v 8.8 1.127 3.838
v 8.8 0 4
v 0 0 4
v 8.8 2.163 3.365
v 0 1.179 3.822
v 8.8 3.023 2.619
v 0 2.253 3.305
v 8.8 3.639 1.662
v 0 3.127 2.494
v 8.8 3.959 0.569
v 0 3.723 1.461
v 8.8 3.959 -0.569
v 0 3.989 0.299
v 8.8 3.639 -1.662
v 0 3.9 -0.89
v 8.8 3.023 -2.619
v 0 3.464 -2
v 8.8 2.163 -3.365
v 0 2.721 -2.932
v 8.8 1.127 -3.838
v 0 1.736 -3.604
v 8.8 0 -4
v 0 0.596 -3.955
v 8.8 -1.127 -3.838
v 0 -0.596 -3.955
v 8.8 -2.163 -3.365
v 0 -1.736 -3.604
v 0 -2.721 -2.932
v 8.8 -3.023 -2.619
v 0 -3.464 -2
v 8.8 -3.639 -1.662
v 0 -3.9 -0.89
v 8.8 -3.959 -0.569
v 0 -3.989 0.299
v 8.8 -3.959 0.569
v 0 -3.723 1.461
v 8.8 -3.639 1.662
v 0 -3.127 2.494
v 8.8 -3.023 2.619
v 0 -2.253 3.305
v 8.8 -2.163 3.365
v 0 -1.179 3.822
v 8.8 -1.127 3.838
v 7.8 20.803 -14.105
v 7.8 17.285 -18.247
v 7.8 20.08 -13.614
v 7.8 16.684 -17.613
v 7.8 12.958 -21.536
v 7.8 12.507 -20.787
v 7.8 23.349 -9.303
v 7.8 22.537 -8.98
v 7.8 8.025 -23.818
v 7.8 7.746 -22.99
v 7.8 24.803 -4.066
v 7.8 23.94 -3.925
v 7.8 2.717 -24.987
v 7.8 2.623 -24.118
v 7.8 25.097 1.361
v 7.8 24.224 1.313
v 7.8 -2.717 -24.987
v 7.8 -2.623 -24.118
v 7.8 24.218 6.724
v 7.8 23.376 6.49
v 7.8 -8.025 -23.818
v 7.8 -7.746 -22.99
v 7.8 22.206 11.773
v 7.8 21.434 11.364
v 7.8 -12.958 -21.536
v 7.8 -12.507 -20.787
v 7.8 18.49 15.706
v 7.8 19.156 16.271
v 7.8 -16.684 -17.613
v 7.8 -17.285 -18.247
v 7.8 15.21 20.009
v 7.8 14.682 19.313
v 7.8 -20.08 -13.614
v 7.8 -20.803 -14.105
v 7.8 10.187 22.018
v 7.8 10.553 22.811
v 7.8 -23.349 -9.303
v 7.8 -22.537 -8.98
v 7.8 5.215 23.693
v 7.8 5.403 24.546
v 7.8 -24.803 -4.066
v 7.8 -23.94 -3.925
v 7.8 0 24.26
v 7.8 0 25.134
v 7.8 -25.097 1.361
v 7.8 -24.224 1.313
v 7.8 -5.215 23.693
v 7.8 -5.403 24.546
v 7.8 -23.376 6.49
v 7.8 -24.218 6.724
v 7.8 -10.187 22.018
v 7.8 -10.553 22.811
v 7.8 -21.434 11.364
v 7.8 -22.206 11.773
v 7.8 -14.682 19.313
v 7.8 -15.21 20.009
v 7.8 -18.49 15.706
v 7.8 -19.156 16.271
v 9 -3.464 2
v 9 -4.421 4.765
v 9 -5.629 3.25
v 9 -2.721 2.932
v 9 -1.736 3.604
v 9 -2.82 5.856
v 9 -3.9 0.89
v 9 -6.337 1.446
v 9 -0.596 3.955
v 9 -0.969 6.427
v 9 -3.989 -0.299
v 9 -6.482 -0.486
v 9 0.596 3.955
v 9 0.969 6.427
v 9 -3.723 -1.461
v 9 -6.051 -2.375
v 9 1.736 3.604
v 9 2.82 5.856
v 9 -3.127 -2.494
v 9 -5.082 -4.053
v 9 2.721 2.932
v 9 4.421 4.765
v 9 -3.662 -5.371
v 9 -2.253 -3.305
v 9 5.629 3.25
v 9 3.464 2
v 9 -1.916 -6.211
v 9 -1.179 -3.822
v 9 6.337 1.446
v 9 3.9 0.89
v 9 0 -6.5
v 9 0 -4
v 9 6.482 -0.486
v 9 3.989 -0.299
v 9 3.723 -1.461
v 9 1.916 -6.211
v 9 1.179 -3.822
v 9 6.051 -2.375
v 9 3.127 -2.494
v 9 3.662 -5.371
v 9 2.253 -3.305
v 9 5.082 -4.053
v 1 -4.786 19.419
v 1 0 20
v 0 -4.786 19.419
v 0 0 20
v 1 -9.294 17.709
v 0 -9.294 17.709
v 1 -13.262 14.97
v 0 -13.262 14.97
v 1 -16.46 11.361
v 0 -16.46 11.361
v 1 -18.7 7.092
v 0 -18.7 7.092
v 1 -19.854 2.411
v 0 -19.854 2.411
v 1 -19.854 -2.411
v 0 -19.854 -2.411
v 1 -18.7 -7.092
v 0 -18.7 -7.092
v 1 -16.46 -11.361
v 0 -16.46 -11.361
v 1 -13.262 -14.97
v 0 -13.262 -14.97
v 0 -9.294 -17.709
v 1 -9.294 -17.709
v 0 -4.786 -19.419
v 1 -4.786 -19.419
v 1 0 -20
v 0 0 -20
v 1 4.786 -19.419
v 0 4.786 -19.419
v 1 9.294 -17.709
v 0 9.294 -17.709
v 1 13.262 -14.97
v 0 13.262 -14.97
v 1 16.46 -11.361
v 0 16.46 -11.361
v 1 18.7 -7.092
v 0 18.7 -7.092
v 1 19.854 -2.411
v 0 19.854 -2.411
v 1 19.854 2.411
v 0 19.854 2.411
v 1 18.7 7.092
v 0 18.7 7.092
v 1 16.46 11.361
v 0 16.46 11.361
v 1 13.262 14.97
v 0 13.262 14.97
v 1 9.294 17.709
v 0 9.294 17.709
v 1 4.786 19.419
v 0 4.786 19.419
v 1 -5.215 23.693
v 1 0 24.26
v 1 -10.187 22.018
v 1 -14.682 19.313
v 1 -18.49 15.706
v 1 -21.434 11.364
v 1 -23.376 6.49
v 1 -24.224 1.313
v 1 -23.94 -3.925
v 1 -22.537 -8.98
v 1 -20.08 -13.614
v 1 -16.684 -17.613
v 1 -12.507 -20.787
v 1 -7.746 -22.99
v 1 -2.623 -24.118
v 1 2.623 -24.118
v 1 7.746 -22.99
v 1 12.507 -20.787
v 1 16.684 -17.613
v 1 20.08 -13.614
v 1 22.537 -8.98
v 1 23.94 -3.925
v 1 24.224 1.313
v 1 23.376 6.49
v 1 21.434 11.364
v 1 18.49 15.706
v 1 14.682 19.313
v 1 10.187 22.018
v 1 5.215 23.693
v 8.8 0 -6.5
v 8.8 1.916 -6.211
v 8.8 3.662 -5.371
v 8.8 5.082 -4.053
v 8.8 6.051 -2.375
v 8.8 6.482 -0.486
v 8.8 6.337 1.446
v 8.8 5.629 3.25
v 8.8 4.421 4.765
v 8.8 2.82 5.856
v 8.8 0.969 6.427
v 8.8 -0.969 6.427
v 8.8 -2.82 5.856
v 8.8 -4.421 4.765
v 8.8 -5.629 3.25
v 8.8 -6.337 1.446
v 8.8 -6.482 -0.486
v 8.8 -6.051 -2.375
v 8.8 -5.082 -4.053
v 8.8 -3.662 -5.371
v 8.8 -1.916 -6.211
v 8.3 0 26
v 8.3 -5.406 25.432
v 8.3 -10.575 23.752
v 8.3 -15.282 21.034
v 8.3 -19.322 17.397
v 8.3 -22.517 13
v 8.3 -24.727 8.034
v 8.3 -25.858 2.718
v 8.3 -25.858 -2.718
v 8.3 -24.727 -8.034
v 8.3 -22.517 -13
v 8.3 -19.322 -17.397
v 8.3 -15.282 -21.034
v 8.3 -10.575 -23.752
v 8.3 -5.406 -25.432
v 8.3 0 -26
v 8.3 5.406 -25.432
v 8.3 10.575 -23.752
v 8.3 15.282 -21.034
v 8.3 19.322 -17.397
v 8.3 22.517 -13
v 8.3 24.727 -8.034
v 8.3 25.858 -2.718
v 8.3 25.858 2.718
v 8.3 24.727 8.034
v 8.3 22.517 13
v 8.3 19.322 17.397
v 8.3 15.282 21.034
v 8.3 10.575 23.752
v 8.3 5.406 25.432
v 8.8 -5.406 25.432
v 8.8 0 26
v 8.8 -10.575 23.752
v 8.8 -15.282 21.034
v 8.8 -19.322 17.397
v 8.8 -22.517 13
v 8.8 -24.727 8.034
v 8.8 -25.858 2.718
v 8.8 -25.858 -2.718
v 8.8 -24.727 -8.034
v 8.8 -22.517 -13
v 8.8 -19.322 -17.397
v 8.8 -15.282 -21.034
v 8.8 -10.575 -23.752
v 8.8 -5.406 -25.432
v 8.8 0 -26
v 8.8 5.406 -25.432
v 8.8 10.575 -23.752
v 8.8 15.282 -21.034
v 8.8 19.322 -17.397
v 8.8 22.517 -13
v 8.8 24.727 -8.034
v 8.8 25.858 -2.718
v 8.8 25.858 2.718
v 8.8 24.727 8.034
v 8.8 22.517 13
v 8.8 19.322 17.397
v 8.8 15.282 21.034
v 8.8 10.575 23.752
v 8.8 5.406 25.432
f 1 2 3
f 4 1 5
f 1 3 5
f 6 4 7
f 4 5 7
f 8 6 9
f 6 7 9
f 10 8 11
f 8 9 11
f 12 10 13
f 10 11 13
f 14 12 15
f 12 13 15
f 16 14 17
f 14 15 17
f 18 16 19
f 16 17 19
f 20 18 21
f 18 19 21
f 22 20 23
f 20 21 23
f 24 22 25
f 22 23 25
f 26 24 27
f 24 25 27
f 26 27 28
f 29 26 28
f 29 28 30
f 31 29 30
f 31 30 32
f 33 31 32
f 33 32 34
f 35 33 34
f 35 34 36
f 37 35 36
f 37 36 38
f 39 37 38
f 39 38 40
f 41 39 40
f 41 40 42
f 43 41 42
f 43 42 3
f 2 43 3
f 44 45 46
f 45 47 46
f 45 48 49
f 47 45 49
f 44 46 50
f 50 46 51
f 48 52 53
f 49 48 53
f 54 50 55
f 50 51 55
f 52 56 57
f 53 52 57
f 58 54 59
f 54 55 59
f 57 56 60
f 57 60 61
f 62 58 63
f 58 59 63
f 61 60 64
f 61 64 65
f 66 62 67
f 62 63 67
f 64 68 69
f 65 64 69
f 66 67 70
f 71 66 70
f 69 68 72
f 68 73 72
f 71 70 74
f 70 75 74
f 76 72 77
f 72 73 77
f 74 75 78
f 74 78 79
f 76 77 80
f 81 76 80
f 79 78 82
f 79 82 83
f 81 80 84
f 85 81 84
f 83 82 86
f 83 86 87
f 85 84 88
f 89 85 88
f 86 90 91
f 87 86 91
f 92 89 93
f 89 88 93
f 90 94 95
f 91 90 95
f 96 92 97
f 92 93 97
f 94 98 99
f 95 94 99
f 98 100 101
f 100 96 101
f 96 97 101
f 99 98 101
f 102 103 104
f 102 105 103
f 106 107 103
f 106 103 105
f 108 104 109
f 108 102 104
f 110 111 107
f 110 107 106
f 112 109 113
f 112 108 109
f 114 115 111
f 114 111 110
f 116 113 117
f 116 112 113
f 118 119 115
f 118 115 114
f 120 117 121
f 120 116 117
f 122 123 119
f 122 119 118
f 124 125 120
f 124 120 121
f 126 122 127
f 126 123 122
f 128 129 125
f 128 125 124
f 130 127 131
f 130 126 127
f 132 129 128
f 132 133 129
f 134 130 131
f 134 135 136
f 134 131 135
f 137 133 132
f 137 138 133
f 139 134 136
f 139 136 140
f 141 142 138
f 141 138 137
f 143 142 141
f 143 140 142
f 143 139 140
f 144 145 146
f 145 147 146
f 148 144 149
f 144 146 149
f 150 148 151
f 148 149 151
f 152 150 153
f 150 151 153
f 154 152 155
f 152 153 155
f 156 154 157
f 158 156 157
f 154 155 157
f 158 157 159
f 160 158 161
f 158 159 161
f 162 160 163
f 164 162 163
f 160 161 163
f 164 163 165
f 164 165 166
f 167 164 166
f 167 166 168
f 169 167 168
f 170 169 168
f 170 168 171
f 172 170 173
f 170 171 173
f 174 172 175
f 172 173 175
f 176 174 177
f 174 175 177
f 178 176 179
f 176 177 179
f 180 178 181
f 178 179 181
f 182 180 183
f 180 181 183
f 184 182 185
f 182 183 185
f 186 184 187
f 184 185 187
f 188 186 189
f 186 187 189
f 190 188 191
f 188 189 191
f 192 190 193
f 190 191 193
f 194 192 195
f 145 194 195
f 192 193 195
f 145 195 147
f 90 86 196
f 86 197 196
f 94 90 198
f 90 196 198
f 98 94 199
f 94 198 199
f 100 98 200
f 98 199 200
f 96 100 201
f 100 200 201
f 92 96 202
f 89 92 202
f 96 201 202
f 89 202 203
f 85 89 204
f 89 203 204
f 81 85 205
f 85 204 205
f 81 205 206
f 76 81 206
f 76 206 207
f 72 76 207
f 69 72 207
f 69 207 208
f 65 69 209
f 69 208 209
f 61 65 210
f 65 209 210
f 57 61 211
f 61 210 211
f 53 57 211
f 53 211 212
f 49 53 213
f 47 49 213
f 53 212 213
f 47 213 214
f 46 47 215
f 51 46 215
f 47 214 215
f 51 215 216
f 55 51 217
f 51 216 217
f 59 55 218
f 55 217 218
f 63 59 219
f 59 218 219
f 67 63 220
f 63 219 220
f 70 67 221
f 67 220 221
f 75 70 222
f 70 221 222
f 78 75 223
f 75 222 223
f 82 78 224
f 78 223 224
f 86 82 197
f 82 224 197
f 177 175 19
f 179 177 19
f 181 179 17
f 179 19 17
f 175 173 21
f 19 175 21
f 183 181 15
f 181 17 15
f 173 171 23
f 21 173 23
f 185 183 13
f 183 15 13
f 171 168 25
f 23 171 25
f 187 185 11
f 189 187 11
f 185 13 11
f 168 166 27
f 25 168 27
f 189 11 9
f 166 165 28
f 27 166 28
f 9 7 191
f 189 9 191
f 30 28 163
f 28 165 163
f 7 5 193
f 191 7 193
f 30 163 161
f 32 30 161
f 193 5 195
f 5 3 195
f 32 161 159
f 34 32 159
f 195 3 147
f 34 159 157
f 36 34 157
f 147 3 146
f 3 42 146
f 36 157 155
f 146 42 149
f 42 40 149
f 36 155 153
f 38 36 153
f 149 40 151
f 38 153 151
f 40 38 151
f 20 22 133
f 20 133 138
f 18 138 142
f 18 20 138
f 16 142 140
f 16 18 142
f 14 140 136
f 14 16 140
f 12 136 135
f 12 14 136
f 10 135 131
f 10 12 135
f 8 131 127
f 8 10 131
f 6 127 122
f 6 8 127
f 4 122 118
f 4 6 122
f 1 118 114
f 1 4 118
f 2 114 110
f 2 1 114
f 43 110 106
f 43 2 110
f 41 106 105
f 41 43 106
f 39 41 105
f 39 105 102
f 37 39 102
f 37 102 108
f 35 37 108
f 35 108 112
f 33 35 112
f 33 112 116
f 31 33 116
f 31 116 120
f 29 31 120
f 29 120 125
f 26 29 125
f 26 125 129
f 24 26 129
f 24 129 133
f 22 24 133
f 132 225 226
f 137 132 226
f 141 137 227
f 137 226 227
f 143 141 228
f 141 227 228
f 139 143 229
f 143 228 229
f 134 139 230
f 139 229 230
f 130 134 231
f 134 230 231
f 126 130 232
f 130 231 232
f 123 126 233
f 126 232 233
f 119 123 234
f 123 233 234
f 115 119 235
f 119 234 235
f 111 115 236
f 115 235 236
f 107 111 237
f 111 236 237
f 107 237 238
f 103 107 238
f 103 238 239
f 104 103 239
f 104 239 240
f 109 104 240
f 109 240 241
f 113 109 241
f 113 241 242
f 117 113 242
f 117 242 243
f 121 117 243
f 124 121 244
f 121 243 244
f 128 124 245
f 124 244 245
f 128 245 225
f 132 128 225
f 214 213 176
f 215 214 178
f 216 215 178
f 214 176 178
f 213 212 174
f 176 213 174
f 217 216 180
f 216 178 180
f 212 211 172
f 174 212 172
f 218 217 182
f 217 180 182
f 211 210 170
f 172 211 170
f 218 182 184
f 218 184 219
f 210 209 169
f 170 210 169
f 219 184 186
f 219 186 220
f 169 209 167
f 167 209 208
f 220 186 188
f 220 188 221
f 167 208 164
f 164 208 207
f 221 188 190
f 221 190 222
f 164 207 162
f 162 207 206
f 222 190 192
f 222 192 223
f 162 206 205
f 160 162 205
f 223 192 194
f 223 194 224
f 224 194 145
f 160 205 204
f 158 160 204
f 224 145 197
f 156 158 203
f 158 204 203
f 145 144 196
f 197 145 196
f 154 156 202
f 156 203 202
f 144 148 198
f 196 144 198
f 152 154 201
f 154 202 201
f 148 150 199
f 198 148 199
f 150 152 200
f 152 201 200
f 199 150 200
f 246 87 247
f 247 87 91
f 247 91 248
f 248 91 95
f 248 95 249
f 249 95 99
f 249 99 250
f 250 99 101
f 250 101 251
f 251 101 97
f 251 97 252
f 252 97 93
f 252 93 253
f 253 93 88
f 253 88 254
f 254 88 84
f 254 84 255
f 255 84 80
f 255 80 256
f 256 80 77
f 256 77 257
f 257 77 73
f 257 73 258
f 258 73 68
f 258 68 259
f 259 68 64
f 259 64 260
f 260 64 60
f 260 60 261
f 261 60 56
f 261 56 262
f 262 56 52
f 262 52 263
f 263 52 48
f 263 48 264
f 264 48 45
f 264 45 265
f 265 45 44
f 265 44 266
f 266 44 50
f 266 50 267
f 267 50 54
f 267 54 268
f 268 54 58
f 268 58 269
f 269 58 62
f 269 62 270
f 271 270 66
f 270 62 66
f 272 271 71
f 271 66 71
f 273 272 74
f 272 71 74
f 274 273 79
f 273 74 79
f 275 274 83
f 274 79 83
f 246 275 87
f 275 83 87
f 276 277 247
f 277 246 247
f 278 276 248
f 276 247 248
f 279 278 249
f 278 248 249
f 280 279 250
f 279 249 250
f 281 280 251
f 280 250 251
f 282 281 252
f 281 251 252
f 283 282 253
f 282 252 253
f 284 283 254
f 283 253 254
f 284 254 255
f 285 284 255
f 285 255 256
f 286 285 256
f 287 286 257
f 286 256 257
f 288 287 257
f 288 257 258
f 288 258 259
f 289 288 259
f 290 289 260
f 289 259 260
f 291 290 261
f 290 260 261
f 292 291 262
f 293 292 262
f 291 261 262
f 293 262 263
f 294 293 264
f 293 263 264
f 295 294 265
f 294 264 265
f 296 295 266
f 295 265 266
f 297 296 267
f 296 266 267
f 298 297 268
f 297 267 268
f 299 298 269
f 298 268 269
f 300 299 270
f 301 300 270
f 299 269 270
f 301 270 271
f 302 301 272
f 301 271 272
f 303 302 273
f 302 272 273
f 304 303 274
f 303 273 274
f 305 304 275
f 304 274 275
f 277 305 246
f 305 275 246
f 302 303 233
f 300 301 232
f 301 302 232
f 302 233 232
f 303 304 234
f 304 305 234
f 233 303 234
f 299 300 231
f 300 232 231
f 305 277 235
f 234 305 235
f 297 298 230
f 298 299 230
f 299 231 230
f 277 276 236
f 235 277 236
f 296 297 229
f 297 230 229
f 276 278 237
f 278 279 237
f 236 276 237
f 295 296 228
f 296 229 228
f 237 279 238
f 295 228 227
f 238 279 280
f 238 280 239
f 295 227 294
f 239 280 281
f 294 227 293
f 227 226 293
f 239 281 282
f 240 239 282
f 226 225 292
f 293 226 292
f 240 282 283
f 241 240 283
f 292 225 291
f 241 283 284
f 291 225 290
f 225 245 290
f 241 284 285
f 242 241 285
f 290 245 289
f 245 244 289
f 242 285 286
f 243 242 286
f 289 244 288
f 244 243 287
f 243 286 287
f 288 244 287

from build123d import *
from build123d.topology import SkipClean

# Parameters (mm, degrees)
PER_AGE1_D         = 8
ESQUISSE13_R       = 6.5
ESQUISSE13_R_2     = 4
BOSS_EXTRU_1_DEPTH = 0.2


with BuildPart() as part:
    # Esquisse1 → Base-Révolution (revolve)
    with BuildSketch(Plane.XY, mode=Mode.PRIVATE) as base_r_volution_sk:
        Polygon((0, 0), (8.8, 0), (8.8, 26), (8.3, 26), (7.8, 25.133974596), (7.8, 24.26), (1, 24.26), (1, 20), (0, 20), align=None)
    revolve(base_r_volution_sk.sketch.rotate(Axis((-7.956160198, 0, 0), (1, 0, 0)), 90), axis=Axis((-7.956160198, 0, 0), (1, 0, 0)))

    # Perçage1 (through all)
    with Locations(Plane(origin=(8.8, 0, 0), x_dir=(0, 0, -1), z_dir=(1, 0, 0))):
        with Locations((0, 0)):
            Hole(PER_AGE1_D / 2)

    # Esquisse13 → Boss.-Extru.1 (add)
    with SkipClean():  # the faces are left unmerged after this step: merging them gives an invalid solid
        with BuildSketch(Plane(origin=(8.8, 0, 0), x_dir=(0, 0, -1), z_dir=(1, 0, 0))):
            Circle(ESQUISSE13_R)
            Circle(ESQUISSE13_R_2, mode=Mode.SUBTRACT)
        extrude(amount=BOSS_EXTRU_1_DEPTH)


solid = part.part
